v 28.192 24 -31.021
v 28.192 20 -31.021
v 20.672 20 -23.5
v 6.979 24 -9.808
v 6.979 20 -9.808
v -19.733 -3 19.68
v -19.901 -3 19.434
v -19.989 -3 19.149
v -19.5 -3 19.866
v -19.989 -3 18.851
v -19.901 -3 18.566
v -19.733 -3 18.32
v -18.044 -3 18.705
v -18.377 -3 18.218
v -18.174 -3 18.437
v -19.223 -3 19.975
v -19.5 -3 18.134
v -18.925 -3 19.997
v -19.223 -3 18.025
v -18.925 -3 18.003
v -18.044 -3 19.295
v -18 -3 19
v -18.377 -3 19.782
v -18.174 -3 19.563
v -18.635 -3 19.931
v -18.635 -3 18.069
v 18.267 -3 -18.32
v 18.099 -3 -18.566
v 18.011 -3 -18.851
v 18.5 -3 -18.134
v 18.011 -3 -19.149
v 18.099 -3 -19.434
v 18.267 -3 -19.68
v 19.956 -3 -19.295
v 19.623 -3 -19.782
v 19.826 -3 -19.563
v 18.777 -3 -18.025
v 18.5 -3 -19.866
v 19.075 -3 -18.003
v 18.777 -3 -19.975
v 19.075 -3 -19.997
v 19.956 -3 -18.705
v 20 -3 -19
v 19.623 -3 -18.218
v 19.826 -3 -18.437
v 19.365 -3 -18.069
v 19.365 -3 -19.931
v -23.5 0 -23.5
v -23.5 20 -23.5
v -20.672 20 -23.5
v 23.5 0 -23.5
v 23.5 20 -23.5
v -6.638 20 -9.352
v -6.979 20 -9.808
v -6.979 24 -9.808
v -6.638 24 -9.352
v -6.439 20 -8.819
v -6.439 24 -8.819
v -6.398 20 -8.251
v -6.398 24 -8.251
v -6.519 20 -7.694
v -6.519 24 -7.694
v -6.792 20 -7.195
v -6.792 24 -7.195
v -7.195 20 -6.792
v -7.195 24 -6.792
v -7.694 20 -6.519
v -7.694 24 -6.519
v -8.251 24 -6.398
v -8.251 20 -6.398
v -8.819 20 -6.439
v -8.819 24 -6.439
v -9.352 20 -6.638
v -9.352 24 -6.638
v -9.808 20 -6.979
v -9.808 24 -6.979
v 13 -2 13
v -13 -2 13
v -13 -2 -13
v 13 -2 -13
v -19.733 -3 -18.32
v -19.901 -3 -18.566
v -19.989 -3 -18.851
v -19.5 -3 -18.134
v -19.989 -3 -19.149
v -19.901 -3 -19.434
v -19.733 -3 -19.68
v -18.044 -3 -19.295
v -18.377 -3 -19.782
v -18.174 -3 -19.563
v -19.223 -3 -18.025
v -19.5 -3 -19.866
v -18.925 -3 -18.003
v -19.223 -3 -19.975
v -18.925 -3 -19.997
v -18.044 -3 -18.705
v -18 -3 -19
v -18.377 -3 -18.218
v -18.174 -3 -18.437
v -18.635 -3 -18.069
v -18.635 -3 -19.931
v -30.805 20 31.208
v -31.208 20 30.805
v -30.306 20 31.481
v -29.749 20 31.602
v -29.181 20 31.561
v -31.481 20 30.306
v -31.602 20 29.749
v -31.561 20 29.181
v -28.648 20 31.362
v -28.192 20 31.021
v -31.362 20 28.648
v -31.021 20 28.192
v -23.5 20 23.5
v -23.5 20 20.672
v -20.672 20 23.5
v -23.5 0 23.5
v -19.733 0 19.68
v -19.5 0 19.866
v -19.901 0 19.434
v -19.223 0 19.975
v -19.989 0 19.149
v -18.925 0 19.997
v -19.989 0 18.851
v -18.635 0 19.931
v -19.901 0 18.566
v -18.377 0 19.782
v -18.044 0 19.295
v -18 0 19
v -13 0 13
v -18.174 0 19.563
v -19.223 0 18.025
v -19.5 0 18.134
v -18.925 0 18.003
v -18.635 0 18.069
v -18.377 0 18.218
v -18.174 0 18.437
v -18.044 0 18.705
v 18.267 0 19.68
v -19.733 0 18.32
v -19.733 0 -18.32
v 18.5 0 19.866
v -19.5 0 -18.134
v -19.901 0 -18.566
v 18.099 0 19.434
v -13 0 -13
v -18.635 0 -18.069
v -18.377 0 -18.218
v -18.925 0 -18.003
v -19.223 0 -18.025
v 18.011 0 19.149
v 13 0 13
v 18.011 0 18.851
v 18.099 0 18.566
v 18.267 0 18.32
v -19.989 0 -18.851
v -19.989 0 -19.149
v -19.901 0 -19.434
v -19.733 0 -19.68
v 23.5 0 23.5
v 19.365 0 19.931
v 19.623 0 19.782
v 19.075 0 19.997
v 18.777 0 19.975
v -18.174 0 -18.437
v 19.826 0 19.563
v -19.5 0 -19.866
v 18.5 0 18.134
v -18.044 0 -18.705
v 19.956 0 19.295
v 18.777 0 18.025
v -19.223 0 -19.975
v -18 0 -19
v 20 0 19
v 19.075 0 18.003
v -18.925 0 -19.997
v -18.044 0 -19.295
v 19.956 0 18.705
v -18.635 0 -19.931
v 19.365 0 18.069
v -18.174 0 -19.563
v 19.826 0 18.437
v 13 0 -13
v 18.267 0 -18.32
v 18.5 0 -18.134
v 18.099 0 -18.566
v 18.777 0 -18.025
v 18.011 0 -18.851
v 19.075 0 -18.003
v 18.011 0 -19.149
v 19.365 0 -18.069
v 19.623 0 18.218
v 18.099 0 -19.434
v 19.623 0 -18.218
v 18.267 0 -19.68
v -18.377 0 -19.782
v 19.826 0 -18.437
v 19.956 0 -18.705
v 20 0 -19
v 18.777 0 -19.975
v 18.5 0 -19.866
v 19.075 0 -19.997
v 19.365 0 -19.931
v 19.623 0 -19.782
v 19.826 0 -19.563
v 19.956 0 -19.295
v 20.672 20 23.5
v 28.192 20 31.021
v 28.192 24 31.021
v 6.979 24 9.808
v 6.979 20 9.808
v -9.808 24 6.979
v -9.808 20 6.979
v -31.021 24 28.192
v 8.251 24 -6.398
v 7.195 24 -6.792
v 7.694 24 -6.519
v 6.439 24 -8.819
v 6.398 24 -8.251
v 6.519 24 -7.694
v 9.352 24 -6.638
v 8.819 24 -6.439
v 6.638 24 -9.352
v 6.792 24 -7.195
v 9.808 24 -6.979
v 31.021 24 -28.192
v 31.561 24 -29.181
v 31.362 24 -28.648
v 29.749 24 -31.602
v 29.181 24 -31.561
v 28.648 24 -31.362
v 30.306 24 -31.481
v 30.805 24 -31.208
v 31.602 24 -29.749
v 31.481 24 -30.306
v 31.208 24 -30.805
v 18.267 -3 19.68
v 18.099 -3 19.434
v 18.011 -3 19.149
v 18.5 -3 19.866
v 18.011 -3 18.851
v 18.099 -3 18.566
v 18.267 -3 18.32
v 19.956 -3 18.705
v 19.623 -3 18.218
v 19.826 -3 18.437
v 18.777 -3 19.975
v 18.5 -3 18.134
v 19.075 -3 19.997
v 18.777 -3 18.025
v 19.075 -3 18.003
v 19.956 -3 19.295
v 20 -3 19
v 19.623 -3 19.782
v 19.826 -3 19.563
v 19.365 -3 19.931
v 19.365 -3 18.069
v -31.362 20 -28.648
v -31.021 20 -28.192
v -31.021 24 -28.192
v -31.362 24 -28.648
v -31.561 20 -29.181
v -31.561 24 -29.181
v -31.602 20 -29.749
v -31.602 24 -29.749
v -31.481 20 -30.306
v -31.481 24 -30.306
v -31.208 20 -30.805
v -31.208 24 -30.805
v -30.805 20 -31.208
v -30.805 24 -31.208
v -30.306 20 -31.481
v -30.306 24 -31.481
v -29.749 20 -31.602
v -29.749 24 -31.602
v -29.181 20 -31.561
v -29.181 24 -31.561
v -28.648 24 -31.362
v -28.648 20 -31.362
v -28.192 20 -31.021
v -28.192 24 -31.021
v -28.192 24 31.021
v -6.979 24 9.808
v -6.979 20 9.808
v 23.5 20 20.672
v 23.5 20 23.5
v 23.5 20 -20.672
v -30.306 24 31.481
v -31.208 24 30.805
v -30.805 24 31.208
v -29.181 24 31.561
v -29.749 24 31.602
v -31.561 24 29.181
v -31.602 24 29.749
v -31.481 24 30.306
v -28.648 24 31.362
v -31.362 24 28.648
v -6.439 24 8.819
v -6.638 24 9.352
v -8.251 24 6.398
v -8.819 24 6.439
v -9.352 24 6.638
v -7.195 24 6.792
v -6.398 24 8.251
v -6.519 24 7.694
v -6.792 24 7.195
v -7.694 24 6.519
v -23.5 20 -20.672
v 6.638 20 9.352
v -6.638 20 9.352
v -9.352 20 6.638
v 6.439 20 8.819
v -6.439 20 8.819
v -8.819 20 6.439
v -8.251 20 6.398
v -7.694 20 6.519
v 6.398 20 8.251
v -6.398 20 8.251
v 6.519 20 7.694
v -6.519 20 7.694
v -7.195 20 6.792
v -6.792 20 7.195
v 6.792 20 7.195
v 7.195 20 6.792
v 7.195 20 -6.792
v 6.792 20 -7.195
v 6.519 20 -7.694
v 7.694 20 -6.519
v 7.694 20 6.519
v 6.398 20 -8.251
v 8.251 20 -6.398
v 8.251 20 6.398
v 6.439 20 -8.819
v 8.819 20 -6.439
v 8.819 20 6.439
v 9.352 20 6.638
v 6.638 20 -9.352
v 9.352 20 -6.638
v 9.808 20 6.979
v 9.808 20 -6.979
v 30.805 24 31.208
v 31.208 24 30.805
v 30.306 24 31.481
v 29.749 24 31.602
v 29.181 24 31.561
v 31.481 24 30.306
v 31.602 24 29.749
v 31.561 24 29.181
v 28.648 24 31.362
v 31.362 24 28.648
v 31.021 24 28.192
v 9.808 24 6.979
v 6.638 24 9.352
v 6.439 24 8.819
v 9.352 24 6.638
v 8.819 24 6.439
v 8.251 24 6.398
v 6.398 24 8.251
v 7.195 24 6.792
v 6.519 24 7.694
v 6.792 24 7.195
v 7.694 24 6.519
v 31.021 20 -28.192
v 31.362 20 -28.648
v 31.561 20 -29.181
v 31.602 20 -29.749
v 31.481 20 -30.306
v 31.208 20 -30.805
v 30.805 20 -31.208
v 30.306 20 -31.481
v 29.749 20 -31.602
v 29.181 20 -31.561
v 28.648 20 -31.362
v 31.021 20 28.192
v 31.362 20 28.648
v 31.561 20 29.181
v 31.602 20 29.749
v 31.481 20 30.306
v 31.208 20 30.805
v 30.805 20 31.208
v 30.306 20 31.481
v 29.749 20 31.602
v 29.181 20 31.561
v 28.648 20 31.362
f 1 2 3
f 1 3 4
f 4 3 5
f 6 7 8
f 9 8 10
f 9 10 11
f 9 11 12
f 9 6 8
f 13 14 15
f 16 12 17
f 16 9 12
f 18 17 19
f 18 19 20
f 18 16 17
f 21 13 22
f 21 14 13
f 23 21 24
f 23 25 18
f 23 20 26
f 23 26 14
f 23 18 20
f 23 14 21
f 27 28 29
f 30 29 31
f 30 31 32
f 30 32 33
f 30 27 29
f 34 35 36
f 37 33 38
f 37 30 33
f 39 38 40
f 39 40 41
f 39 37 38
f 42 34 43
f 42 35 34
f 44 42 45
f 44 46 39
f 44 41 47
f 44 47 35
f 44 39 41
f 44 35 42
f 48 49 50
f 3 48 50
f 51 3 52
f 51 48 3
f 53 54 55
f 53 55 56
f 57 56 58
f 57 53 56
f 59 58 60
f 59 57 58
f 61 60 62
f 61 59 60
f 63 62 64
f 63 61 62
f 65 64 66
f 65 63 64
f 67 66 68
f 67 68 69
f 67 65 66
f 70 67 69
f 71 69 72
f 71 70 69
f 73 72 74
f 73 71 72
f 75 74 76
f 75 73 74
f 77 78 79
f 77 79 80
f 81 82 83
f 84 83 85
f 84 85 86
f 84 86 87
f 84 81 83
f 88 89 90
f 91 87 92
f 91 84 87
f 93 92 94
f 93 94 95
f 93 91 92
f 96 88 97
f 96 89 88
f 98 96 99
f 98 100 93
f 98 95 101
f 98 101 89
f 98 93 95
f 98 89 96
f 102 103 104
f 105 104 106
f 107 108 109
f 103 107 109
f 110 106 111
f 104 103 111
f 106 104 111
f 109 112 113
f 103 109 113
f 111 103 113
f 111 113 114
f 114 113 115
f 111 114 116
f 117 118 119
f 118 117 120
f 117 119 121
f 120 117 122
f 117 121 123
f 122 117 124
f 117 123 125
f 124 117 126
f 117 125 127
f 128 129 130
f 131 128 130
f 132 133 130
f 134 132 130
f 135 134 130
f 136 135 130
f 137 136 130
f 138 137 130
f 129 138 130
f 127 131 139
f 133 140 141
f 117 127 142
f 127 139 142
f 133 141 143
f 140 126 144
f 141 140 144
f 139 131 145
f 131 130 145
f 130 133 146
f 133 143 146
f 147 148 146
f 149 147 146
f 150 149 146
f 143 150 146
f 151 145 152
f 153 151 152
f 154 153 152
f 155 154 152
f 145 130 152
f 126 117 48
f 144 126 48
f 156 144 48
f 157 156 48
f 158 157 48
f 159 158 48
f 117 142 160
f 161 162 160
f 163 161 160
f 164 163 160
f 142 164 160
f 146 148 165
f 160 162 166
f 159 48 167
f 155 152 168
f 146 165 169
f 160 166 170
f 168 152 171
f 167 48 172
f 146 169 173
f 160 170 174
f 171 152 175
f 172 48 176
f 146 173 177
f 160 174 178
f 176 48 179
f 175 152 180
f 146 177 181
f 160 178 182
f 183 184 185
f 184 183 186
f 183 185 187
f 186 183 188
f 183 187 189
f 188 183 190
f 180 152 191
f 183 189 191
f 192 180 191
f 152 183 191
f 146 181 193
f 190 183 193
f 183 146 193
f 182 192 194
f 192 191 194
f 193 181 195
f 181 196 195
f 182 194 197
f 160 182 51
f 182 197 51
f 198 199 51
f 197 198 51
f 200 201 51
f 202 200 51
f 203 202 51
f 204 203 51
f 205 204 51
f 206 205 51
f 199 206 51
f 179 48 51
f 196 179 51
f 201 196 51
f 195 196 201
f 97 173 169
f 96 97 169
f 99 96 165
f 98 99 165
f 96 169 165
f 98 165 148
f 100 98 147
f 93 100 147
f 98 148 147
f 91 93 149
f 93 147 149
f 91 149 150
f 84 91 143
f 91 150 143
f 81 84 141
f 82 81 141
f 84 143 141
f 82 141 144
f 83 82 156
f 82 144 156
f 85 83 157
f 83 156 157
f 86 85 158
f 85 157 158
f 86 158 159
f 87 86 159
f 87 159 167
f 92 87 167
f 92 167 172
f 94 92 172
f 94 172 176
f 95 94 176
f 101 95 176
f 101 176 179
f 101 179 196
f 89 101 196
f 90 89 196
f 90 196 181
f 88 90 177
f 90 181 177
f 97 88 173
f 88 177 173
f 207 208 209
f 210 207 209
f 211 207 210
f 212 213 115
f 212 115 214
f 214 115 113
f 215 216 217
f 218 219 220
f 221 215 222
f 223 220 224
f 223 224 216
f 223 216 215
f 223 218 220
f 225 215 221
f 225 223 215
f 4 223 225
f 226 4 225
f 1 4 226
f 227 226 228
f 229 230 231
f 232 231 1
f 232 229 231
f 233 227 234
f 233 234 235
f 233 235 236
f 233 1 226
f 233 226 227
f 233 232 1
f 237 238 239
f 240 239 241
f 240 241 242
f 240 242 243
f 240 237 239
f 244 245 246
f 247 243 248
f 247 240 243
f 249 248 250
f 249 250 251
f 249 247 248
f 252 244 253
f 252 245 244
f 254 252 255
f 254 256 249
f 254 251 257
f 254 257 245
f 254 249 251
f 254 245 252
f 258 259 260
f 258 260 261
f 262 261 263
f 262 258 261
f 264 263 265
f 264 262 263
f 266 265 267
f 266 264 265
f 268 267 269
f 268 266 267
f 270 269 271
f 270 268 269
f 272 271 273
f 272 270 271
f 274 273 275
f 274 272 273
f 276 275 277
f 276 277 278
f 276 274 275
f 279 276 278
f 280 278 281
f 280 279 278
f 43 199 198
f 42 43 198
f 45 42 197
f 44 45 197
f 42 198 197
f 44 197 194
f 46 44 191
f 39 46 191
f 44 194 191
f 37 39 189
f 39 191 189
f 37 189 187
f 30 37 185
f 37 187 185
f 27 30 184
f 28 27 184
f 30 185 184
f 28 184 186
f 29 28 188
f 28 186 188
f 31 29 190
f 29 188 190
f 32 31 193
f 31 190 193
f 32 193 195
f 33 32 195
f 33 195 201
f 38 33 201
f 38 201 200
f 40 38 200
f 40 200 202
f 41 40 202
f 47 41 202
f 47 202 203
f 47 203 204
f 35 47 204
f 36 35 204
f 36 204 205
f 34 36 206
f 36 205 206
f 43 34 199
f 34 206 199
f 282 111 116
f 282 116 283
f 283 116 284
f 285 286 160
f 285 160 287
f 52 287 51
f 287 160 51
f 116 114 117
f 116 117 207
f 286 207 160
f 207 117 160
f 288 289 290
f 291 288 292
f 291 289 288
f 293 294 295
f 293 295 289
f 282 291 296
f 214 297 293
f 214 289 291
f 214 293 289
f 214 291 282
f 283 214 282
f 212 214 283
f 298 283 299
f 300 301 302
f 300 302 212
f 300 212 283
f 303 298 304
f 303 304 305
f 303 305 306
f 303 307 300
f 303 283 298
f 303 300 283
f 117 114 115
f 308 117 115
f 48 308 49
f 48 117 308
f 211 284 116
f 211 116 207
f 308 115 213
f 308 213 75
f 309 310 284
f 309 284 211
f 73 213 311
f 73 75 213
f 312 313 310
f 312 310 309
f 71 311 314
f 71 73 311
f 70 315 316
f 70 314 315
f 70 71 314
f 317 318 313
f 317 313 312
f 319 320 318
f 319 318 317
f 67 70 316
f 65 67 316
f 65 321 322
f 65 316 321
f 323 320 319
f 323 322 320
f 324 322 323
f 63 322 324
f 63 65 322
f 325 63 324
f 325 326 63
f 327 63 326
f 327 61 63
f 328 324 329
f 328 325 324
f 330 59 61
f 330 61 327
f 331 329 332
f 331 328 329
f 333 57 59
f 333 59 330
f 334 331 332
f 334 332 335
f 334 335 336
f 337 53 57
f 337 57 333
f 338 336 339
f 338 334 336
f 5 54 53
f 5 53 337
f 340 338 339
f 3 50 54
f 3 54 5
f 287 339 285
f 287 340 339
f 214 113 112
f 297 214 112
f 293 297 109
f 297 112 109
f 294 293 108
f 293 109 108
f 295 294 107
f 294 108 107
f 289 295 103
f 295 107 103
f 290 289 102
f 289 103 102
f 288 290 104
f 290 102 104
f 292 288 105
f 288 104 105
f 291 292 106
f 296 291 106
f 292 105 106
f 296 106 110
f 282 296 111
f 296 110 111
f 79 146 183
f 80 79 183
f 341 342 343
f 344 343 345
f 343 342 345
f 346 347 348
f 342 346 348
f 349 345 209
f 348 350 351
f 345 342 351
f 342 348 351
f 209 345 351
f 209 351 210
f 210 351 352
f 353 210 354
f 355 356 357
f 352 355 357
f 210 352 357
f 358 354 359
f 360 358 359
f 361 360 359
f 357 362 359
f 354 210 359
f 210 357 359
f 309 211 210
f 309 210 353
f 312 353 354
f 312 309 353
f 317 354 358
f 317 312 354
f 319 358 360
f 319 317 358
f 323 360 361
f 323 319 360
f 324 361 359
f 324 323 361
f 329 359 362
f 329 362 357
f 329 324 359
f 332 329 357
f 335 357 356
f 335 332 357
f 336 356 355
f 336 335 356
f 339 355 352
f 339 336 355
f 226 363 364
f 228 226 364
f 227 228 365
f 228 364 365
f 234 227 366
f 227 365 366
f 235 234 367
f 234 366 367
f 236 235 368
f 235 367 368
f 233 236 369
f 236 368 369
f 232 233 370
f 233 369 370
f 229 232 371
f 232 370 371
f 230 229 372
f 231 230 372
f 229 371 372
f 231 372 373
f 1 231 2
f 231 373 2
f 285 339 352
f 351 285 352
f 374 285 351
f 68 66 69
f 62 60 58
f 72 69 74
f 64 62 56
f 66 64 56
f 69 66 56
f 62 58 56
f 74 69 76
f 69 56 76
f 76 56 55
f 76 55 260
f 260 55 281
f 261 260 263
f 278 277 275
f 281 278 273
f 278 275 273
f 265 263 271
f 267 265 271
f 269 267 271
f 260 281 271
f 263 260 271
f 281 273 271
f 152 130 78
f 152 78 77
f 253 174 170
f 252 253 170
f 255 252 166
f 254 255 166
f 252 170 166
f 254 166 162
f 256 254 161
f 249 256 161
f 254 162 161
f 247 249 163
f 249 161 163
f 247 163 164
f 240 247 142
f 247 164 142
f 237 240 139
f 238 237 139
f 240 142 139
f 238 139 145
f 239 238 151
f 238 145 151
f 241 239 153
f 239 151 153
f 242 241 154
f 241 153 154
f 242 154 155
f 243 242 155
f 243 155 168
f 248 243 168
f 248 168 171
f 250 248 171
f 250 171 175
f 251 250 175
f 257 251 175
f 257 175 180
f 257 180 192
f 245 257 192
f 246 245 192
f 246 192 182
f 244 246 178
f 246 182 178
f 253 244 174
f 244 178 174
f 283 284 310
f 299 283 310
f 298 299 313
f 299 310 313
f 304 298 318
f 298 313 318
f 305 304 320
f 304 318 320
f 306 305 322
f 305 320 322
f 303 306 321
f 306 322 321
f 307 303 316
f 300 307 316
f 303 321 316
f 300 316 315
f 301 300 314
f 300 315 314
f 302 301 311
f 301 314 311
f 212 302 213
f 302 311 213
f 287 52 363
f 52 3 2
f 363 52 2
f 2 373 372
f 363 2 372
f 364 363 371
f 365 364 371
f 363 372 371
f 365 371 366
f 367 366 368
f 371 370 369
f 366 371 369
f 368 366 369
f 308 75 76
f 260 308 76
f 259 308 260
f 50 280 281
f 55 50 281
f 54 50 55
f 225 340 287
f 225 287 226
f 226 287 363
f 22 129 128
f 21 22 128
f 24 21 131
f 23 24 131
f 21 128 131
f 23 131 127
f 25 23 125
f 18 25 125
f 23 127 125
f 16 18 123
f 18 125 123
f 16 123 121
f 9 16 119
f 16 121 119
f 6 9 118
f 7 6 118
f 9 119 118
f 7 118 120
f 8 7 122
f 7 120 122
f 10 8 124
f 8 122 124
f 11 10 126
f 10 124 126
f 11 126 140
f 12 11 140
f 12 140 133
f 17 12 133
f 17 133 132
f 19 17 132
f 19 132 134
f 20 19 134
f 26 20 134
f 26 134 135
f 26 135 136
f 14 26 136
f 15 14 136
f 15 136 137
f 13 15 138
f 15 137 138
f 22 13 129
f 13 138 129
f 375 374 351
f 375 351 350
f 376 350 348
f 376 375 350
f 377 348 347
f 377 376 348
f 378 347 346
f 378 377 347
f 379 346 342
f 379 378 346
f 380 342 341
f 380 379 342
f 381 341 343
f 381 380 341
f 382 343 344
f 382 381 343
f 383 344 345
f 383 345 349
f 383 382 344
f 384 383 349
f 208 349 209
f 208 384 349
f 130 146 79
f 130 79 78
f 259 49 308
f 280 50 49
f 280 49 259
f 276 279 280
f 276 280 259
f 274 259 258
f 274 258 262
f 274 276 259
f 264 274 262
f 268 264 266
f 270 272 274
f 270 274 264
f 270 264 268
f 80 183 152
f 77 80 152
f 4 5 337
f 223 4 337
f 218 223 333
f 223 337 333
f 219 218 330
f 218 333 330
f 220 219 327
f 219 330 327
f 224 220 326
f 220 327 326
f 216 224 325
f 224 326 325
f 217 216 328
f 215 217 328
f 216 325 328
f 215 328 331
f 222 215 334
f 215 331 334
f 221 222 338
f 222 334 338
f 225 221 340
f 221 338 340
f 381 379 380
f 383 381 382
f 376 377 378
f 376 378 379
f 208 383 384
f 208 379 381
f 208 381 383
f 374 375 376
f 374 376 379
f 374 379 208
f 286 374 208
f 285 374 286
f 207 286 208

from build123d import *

# Parameters (mm, degrees)
ESQUISSE1_W        = 47
ESQUISSE1_H        = 47
BOSS_EXTRU_1_DEPTH = 20
ESQUISSE2_R        = 1
BOSS_EXTRU_2_DEPTH = 3
BOSS_EXTRU_3_DEPTH = 4
ESQUISSE4_W        = 26
ESQUISSE4_H        = 26
BOSS_EXTRU_4_DEPTH = 2


with BuildPart() as part:
    # Esquisse1 → Boss.-Extru.1 (new body)
    with BuildSketch(Plane(origin=(0, 0, 0), x_dir=(1, 0, 0), z_dir=(0, 1, 0))):
        Rectangle(ESQUISSE1_W, ESQUISSE1_H)
    extrude(amount=BOSS_EXTRU_1_DEPTH)

    # Esquisse2 → Boss.-Extru.2 (add)
    with BuildSketch(Plane.XZ):
        with Locations((19, -19)):
            Circle(ESQUISSE2_R)
        with Locations((-19, -19)):
            Circle(ESQUISSE2_R)
        with Locations((-19, 19)):
            Circle(ESQUISSE2_R)
        with Locations((19, 19)):
            Circle(ESQUISSE2_R)
    extrude(amount=BOSS_EXTRU_2_DEPTH)

    # Esquisse3 → Boss.-Extru.3 (add)
    with BuildSketch(Plane(origin=(0, 20, 0), x_dir=(1, 0, 0), z_dir=(0, 1, 0))):
        with BuildLine():
            Line((9.807611845, -6.97918472), (31.02081528, -28.192388155))
            ThreePointArc((31.02081528, -28.192388155), (31.02081528, -31.02081528), (28.192388155, -31.02081528))
            Line((28.192388155, -31.02081528), (6.97918472, -9.807611845))
            ThreePointArc((6.97918472, -9.807611845), (6.97918472, -6.97918472), (9.807611845, -6.97918472))
        make_face()
        with BuildLine():
            Line((9.807611845, 6.97918472), (31.02081528, 28.192388155))
            ThreePointArc((31.02081528, 28.192388155), (31.02081528, 31.02081528), (28.192388155, 31.02081528))
            Line((28.192388155, 31.02081528), (6.97918472, 9.807611845))
            ThreePointArc((6.97918472, 9.807611845), (6.97918472, 6.97918472), (9.807611845, 6.97918472))
        make_face()
        with BuildLine():
            Line((-9.807611845, -6.97918472), (-31.02081528, -28.192388155))
            ThreePointArc((-31.02081528, -28.192388155), (-31.02081528, -31.02081528), (-28.192388155, -31.02081528))
            Line((-28.192388155, -31.02081528), (-6.97918472, -9.807611845))
            ThreePointArc((-6.97918472, -9.807611845), (-6.97918472, -6.97918472), (-9.807611845, -6.97918472))
        make_face()
        with BuildLine():
            Line((-9.807611845, 6.97918472), (-31.02081528, 28.192388155))
            ThreePointArc((-31.02081528, 28.192388155), (-31.02081528, 31.02081528), (-28.192388155, 31.02081528))
            Line((-28.192388155, 31.02081528), (-6.97918472, 9.807611845))
            ThreePointArc((-6.97918472, 9.807611845), (-6.97918472, 6.97918472), (-9.807611845, 6.97918472))
        make_face()
    extrude(amount=BOSS_EXTRU_3_DEPTH)

    # Esquisse4 → Boss.-Extru.4 (add)
    with BuildSketch(Plane.XZ):
        Rectangle(ESQUISSE4_W, ESQUISSE4_H)
    extrude(amount=BOSS_EXTRU_4_DEPTH)


solid = part.part
